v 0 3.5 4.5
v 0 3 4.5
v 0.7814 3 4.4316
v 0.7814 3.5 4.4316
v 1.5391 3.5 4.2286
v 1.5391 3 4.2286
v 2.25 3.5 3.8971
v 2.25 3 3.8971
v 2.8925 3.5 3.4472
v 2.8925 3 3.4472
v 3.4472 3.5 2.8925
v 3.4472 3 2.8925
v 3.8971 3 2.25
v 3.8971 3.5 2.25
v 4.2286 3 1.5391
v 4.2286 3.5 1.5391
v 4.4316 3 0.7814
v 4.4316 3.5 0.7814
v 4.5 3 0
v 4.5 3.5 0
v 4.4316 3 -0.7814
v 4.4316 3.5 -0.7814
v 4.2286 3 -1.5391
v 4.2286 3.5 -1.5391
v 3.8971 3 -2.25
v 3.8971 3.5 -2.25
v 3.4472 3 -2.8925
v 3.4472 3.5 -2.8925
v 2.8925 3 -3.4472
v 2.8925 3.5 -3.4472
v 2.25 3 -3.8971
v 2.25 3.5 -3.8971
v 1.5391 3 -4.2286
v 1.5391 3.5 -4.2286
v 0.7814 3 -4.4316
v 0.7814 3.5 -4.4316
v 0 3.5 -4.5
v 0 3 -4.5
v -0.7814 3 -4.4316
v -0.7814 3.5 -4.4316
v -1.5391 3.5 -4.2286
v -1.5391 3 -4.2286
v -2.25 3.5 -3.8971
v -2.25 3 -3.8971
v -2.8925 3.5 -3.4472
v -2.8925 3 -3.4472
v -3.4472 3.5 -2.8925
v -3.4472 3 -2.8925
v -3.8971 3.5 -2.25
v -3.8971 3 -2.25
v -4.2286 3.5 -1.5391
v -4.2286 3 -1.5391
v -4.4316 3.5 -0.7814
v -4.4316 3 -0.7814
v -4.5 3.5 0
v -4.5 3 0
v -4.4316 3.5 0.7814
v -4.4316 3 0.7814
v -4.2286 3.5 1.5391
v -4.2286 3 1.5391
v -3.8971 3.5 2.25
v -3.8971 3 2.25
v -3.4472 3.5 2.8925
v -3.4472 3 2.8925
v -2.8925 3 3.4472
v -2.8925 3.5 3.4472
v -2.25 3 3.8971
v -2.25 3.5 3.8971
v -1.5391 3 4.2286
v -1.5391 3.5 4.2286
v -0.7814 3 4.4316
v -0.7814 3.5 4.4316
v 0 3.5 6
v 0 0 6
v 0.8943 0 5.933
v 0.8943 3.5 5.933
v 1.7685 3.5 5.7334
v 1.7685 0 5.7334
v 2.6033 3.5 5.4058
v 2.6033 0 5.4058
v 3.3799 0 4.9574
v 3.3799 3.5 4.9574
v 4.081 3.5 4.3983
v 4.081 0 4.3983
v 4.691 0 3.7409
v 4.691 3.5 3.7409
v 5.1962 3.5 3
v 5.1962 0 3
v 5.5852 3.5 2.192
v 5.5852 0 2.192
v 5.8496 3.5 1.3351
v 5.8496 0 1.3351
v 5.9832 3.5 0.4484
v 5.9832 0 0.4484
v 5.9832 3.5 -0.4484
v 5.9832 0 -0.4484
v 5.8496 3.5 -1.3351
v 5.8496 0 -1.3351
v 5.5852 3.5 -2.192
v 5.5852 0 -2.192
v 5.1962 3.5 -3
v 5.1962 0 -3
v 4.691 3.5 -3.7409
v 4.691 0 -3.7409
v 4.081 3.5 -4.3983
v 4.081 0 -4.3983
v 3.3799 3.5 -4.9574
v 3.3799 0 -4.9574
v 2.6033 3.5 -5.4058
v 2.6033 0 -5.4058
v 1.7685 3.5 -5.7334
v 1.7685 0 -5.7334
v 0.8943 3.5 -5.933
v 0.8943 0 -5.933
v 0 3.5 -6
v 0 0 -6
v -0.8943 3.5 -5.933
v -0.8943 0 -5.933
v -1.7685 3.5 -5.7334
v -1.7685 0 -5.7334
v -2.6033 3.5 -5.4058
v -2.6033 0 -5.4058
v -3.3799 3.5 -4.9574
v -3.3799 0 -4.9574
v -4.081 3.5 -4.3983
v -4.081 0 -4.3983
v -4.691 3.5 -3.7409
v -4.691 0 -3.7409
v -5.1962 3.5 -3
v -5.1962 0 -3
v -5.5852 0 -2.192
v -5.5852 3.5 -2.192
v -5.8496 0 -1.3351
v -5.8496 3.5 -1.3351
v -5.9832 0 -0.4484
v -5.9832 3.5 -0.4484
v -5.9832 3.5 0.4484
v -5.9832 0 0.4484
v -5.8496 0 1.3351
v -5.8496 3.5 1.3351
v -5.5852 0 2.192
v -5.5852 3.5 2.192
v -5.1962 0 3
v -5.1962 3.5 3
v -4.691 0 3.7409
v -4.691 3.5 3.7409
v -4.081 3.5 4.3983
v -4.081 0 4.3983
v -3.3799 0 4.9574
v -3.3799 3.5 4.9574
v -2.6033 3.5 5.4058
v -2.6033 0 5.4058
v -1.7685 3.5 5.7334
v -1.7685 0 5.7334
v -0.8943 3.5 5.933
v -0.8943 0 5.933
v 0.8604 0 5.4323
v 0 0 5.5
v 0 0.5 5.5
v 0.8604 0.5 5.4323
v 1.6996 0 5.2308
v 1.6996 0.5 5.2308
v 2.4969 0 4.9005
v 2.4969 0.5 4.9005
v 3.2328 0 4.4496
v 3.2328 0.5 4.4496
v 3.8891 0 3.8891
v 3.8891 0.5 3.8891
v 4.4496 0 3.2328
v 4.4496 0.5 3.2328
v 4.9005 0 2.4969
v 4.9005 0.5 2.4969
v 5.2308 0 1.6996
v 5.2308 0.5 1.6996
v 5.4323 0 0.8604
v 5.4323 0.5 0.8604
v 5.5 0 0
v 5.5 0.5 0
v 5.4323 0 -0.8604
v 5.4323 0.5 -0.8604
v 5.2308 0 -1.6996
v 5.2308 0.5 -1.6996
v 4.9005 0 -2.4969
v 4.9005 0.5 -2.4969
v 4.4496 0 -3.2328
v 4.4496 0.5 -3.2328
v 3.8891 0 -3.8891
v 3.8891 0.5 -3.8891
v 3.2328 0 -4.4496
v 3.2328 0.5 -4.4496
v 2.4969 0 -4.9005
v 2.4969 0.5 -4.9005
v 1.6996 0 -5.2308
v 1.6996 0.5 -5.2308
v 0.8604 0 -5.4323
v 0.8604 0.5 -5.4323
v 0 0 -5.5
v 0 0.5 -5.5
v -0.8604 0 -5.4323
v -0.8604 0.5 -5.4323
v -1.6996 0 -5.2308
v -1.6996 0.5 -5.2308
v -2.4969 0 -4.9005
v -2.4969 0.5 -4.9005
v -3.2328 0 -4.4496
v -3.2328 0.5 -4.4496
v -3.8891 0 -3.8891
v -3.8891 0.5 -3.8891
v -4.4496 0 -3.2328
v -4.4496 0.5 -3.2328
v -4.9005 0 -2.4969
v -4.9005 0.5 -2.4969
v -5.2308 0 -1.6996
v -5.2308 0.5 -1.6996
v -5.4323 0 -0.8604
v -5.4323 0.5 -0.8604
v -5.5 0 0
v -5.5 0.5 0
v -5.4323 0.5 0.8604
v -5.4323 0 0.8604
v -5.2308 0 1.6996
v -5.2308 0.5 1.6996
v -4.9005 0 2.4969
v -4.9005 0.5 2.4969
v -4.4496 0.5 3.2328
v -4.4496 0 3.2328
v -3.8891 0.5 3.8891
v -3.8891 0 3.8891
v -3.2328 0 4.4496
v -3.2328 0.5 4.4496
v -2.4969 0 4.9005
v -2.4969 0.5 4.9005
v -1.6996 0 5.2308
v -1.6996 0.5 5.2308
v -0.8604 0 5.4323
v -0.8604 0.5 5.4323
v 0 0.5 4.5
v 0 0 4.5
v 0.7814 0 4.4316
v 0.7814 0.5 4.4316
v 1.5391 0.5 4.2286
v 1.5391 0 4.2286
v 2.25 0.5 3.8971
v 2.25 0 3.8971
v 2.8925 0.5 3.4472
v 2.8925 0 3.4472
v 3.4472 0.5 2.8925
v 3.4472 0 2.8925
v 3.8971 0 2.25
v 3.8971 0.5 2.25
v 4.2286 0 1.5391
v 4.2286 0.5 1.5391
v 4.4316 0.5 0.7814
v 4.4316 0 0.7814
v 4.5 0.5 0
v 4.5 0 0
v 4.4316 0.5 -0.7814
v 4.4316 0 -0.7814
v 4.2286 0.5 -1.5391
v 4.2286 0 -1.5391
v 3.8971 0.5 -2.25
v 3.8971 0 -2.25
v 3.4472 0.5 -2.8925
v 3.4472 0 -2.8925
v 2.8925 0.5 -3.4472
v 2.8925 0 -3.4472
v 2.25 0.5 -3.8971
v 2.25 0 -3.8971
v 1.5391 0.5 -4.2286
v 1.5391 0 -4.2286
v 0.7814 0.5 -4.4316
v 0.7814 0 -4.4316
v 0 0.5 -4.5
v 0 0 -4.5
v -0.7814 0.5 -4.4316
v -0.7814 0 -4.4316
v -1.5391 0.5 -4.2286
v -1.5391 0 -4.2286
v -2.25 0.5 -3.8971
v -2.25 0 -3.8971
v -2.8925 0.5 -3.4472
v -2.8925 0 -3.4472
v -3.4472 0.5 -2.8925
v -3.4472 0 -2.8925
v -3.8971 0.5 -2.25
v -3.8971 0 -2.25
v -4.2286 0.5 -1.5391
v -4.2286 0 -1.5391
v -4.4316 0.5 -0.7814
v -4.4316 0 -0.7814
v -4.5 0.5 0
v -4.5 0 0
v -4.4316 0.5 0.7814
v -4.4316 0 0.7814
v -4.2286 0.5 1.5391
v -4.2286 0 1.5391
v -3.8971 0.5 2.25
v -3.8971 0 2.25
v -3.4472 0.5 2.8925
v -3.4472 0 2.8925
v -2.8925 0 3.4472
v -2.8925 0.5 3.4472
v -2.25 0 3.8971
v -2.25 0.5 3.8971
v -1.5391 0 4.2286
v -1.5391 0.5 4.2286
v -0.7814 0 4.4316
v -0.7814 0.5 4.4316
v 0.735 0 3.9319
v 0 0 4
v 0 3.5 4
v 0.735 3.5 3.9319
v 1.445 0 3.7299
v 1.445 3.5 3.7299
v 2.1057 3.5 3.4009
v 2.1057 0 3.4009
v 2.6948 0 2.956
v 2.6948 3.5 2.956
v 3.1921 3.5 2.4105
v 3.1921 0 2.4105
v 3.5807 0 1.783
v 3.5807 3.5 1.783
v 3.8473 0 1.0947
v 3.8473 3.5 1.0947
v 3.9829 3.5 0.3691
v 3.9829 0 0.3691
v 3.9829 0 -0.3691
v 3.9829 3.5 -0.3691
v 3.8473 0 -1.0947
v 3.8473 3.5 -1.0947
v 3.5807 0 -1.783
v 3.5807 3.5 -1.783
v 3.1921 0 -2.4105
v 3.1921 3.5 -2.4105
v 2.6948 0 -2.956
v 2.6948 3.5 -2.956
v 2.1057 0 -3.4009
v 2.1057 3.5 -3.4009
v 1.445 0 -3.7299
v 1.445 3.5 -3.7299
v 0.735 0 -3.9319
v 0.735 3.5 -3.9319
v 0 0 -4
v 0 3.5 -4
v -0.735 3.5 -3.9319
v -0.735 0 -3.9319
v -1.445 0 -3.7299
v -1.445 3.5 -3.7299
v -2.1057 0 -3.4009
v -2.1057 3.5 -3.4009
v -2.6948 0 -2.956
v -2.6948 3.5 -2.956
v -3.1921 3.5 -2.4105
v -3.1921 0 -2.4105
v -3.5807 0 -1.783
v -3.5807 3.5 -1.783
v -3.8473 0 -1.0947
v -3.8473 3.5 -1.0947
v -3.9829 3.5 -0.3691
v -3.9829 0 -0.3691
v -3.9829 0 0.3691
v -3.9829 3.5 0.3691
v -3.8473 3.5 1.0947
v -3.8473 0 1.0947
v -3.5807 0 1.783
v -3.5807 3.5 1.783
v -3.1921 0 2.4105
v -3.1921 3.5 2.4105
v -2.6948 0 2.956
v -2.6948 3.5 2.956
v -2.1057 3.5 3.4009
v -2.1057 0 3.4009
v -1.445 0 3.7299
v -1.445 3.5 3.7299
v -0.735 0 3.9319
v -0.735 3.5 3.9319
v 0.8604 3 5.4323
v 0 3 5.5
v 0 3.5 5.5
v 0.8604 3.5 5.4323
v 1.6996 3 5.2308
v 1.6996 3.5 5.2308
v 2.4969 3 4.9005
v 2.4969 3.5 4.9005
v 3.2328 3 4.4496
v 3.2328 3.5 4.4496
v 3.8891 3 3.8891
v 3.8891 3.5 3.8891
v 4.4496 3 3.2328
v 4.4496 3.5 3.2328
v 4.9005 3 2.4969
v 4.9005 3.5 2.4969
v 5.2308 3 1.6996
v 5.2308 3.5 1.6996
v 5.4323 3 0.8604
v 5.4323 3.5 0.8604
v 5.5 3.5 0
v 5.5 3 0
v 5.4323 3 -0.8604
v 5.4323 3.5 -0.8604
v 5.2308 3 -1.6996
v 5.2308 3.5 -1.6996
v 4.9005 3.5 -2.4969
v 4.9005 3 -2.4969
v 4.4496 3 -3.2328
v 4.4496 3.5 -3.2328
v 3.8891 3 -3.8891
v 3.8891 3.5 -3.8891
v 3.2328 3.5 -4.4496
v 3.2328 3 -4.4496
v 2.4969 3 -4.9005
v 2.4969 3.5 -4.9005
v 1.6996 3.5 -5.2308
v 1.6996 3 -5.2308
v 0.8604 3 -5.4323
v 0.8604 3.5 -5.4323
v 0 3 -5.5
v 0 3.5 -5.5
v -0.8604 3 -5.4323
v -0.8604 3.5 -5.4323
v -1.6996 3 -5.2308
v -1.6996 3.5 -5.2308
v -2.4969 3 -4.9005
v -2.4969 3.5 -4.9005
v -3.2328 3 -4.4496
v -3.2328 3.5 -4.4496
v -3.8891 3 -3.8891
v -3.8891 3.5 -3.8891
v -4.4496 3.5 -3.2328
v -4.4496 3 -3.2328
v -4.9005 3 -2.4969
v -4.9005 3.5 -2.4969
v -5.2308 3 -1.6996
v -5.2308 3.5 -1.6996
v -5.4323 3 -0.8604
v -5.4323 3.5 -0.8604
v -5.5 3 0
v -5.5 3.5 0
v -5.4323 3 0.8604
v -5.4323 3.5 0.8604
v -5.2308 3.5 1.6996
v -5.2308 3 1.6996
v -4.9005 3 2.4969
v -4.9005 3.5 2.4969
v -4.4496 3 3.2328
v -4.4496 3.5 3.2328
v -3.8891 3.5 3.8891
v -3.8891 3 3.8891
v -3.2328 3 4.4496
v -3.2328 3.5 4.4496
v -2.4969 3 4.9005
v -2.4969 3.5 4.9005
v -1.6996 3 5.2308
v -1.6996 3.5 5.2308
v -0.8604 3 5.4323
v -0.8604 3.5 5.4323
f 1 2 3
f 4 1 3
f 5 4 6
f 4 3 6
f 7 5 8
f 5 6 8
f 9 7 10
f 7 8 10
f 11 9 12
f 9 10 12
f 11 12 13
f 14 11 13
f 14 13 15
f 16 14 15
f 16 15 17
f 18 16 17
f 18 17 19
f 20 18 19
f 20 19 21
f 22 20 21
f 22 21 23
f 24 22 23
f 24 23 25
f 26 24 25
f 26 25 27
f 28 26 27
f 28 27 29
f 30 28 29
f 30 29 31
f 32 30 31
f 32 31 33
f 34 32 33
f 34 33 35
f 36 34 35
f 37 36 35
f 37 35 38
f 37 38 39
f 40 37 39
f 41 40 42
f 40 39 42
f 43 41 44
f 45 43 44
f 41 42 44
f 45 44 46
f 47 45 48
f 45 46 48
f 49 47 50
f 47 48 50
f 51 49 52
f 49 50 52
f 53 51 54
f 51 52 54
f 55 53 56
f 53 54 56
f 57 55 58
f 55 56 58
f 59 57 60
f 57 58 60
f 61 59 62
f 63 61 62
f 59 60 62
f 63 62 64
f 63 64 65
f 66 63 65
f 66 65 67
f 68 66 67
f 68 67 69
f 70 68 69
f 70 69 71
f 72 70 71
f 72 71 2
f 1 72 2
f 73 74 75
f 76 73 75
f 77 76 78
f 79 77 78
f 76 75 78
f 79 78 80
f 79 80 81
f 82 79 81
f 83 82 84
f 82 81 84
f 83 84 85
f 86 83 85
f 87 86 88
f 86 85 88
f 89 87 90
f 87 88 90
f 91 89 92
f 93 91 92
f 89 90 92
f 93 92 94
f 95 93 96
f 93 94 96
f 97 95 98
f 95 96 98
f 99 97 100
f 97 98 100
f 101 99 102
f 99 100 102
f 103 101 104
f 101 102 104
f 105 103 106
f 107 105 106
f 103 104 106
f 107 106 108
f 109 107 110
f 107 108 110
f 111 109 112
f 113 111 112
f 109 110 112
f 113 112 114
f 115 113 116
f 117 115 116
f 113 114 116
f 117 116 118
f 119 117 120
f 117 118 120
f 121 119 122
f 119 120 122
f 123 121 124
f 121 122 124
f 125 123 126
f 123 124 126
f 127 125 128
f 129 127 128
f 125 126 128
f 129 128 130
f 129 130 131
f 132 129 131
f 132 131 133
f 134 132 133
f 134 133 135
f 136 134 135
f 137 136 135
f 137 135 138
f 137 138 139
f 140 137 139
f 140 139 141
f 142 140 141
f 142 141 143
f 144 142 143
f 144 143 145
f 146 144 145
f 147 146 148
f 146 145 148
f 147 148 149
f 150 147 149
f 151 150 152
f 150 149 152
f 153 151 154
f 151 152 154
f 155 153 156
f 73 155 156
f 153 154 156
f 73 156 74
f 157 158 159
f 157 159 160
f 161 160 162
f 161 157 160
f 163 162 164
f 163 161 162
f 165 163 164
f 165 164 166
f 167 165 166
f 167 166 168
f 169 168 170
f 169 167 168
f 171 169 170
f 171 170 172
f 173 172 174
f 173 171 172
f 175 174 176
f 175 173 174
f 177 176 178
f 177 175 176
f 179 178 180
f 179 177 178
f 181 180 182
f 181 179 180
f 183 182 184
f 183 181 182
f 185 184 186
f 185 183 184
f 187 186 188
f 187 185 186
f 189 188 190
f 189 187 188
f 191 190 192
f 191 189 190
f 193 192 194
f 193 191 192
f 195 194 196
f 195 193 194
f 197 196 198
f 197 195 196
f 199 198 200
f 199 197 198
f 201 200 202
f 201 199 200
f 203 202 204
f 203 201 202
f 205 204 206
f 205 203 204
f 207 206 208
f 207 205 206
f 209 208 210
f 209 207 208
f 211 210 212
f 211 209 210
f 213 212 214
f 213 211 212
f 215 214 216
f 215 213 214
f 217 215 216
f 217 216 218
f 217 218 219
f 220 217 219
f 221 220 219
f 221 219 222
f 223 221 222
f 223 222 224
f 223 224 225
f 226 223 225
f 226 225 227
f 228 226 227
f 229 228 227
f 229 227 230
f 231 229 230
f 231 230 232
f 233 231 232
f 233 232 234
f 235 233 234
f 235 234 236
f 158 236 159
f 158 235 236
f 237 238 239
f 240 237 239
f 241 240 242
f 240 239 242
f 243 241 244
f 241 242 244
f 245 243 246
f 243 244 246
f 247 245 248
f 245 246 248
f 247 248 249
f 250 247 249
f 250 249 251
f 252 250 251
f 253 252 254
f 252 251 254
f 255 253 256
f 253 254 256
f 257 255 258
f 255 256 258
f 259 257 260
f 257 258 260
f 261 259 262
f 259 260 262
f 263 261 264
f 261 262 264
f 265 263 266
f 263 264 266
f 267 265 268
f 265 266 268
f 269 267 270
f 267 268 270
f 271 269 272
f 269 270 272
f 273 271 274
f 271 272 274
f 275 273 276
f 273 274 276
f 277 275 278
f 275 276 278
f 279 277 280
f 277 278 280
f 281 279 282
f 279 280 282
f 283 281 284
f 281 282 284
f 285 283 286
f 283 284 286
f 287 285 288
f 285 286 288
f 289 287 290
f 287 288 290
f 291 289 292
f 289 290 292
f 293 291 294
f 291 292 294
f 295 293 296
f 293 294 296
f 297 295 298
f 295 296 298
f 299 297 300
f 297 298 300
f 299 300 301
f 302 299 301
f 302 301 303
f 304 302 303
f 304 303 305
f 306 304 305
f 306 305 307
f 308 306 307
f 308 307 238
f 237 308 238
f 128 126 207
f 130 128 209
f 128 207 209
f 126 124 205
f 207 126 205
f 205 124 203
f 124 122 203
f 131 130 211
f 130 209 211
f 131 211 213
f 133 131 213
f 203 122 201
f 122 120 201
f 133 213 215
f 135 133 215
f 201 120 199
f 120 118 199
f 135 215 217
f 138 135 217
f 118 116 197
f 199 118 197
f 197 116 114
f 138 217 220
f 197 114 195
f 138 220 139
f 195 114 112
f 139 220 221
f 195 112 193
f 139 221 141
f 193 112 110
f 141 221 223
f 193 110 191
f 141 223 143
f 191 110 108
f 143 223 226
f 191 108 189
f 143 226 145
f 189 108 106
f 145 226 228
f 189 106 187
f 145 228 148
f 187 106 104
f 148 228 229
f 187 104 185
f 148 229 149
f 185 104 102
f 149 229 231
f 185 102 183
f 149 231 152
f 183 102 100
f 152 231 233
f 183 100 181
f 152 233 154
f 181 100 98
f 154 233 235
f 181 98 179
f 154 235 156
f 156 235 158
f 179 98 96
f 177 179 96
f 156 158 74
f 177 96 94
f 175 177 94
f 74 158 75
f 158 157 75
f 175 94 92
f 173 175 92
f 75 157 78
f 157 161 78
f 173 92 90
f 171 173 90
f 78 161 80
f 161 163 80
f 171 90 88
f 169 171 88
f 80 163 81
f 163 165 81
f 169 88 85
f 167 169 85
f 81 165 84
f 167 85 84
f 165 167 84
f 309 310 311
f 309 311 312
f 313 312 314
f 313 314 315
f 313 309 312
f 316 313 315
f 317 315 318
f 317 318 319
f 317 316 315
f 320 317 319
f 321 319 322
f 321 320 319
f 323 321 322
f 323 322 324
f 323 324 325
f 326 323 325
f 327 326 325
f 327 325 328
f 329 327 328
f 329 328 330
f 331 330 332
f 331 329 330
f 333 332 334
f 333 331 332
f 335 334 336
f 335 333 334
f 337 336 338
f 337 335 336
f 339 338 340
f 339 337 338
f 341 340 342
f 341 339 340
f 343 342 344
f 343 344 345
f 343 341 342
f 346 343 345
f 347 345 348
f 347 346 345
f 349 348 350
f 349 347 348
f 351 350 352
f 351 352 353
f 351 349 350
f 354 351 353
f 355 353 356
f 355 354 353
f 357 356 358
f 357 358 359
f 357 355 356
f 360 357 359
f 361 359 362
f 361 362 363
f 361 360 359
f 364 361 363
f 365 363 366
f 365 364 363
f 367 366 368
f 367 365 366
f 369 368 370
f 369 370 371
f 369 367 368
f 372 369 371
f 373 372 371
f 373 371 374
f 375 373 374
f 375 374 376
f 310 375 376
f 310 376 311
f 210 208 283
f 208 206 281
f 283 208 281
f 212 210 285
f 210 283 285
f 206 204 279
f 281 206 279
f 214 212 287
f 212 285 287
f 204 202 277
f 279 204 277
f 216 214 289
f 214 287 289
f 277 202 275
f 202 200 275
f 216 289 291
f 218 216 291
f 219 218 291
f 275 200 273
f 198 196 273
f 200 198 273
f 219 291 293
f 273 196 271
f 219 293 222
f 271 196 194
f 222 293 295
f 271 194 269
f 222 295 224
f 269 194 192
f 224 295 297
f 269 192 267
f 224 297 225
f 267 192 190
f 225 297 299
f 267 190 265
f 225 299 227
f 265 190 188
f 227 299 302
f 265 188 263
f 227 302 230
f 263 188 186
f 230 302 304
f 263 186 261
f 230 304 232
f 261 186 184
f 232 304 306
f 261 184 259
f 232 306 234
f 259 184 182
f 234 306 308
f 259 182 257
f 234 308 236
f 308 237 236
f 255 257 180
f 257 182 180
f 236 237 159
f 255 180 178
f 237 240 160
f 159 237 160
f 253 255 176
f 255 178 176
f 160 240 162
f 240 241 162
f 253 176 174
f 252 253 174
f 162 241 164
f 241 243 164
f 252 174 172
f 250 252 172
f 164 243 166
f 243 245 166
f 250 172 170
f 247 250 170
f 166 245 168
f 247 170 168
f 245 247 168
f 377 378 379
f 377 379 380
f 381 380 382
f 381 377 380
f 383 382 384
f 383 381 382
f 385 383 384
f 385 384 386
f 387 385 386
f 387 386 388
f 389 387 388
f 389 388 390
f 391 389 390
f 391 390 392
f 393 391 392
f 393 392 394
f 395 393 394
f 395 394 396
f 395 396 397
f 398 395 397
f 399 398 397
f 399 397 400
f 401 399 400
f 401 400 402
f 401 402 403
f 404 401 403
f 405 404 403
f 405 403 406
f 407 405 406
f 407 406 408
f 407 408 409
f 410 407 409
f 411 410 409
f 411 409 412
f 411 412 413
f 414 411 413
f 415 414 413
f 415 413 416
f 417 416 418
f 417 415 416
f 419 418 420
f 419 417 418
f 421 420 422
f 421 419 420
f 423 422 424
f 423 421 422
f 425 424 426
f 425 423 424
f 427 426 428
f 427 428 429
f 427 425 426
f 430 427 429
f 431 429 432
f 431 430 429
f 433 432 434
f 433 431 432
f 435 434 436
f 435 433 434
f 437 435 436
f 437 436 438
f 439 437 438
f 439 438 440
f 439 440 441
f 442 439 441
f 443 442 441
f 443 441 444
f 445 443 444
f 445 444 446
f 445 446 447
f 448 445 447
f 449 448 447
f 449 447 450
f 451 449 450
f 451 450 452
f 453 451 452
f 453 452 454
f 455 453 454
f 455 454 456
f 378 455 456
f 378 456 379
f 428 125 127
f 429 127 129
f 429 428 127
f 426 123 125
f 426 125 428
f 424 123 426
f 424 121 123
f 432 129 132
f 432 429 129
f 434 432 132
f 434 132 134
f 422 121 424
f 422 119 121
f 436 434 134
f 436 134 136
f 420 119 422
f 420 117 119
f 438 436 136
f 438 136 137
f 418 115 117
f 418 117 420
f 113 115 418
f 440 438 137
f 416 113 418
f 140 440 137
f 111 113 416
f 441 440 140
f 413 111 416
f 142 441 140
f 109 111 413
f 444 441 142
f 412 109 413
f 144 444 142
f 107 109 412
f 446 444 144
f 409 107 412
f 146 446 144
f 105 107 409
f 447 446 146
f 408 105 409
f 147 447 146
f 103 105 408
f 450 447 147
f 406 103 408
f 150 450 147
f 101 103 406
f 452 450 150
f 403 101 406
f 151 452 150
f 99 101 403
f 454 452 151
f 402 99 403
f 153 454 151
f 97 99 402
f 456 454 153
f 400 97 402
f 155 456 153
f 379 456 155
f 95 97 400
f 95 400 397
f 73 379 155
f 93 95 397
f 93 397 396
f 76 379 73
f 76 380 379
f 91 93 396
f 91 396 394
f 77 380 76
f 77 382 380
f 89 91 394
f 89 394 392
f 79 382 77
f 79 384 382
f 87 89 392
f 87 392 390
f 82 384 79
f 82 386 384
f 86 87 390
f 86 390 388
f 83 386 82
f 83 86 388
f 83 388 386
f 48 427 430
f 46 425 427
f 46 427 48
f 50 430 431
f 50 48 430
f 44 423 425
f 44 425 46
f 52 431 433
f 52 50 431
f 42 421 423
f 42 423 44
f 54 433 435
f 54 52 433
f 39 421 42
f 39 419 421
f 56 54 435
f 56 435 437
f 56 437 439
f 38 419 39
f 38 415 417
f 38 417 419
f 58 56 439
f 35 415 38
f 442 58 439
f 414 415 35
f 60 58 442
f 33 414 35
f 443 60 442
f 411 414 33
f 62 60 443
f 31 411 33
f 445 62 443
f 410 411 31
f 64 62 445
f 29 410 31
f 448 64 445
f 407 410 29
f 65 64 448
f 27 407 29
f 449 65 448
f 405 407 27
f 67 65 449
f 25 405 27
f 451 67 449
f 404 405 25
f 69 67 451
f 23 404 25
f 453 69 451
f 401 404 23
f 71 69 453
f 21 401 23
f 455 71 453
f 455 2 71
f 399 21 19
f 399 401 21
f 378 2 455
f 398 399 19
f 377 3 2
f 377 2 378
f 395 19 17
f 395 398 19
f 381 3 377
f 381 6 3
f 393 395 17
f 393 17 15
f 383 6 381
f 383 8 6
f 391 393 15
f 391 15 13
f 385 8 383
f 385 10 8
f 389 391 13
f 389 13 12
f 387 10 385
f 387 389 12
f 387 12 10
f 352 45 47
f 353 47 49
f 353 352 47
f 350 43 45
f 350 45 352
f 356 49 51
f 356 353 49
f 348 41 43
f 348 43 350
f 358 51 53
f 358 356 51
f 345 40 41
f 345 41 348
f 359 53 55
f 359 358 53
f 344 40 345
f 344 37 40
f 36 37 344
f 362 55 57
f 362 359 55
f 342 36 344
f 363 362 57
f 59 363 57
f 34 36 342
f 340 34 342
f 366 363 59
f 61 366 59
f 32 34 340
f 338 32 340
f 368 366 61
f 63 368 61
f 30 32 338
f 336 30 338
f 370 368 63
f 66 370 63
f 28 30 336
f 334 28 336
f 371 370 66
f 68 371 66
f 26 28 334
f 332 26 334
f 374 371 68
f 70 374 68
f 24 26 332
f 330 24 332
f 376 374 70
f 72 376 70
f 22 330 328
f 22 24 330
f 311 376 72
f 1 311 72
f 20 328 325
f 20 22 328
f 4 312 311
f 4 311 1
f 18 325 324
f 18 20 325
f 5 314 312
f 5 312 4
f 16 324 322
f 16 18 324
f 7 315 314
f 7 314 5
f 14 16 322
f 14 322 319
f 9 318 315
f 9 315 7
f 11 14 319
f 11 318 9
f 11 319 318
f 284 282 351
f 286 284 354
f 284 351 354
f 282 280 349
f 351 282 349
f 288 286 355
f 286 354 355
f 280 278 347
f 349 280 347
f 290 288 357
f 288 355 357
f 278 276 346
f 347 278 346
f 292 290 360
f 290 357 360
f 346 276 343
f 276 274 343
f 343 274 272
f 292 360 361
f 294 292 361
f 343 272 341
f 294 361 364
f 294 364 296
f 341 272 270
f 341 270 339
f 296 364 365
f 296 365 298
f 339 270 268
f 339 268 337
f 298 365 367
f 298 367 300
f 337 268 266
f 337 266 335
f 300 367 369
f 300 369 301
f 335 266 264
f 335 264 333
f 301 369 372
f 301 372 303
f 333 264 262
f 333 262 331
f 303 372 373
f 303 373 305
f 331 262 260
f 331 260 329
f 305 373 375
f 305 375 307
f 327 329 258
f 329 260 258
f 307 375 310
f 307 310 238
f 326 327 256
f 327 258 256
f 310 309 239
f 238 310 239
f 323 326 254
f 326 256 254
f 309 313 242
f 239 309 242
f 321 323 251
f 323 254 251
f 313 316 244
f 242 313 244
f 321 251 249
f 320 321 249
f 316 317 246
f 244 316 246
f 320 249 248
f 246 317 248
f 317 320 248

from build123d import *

# Parameters (mm, degrees)
SKETCH_1_R          = 4.5
SKETCH_1_R_2        = 4
EXTRUDE_1_DEPTH     = 3.5
SKETCH_1_3_R        = 5.5
SKETCH_1_3_R_2      = 4.5
EXTRUDE_2_DEPTH     = 3
SKETCH_1_4_R        = 6
SKETCH_1_4_R_2      = 5.5
EXTRUDE_3_DEPTH     = 3.5
SKETCH_1_5_R        = 5.5
SKETCH_1_5_R_2      = 4.5
CUT_EXTRUDE_1_DEPTH = 0.5


with BuildPart() as part:
    # 草图1 → 凸台-拉伸1 (new body)
    with BuildSketch(Plane(origin=(0, 0, 0), x_dir=(1, 0, 0), z_dir=(0, 1, 0))):
        Circle(SKETCH_1_R)
        Circle(SKETCH_1_R_2, mode=Mode.SUBTRACT)
    extrude(amount=EXTRUDE_1_DEPTH)

    # 草图1<3> → 凸台-拉伸2 (add)
    with BuildSketch(Plane(origin=(0, 0, 0), x_dir=(1, 0, 0), z_dir=(0, 1, 0))):
        Circle(SKETCH_1_3_R)
        Circle(SKETCH_1_3_R_2, mode=Mode.SUBTRACT)
    extrude(amount=EXTRUDE_2_DEPTH)

    # 草图1<4> → 凸台-拉伸3 (add)
    with BuildSketch(Plane(origin=(0, 0, 0), x_dir=(1, 0, 0), z_dir=(0, 1, 0))):
        Circle(SKETCH_1_4_R)
        Circle(SKETCH_1_4_R_2, mode=Mode.SUBTRACT)
    extrude(amount=EXTRUDE_3_DEPTH)

    # 草图1<5> → 切除-拉伸1 (cut)
    with BuildSketch(Plane(origin=(0, 0, 0), x_dir=(1, 0, 0), z_dir=(0, 1, 0))):
        Circle(SKETCH_1_5_R)
        Circle(SKETCH_1_5_R_2, mode=Mode.SUBTRACT)
    extrude(amount=CUT_EXTRUDE_1_DEPTH, mode=Mode.SUBTRACT)


solid = part.part
